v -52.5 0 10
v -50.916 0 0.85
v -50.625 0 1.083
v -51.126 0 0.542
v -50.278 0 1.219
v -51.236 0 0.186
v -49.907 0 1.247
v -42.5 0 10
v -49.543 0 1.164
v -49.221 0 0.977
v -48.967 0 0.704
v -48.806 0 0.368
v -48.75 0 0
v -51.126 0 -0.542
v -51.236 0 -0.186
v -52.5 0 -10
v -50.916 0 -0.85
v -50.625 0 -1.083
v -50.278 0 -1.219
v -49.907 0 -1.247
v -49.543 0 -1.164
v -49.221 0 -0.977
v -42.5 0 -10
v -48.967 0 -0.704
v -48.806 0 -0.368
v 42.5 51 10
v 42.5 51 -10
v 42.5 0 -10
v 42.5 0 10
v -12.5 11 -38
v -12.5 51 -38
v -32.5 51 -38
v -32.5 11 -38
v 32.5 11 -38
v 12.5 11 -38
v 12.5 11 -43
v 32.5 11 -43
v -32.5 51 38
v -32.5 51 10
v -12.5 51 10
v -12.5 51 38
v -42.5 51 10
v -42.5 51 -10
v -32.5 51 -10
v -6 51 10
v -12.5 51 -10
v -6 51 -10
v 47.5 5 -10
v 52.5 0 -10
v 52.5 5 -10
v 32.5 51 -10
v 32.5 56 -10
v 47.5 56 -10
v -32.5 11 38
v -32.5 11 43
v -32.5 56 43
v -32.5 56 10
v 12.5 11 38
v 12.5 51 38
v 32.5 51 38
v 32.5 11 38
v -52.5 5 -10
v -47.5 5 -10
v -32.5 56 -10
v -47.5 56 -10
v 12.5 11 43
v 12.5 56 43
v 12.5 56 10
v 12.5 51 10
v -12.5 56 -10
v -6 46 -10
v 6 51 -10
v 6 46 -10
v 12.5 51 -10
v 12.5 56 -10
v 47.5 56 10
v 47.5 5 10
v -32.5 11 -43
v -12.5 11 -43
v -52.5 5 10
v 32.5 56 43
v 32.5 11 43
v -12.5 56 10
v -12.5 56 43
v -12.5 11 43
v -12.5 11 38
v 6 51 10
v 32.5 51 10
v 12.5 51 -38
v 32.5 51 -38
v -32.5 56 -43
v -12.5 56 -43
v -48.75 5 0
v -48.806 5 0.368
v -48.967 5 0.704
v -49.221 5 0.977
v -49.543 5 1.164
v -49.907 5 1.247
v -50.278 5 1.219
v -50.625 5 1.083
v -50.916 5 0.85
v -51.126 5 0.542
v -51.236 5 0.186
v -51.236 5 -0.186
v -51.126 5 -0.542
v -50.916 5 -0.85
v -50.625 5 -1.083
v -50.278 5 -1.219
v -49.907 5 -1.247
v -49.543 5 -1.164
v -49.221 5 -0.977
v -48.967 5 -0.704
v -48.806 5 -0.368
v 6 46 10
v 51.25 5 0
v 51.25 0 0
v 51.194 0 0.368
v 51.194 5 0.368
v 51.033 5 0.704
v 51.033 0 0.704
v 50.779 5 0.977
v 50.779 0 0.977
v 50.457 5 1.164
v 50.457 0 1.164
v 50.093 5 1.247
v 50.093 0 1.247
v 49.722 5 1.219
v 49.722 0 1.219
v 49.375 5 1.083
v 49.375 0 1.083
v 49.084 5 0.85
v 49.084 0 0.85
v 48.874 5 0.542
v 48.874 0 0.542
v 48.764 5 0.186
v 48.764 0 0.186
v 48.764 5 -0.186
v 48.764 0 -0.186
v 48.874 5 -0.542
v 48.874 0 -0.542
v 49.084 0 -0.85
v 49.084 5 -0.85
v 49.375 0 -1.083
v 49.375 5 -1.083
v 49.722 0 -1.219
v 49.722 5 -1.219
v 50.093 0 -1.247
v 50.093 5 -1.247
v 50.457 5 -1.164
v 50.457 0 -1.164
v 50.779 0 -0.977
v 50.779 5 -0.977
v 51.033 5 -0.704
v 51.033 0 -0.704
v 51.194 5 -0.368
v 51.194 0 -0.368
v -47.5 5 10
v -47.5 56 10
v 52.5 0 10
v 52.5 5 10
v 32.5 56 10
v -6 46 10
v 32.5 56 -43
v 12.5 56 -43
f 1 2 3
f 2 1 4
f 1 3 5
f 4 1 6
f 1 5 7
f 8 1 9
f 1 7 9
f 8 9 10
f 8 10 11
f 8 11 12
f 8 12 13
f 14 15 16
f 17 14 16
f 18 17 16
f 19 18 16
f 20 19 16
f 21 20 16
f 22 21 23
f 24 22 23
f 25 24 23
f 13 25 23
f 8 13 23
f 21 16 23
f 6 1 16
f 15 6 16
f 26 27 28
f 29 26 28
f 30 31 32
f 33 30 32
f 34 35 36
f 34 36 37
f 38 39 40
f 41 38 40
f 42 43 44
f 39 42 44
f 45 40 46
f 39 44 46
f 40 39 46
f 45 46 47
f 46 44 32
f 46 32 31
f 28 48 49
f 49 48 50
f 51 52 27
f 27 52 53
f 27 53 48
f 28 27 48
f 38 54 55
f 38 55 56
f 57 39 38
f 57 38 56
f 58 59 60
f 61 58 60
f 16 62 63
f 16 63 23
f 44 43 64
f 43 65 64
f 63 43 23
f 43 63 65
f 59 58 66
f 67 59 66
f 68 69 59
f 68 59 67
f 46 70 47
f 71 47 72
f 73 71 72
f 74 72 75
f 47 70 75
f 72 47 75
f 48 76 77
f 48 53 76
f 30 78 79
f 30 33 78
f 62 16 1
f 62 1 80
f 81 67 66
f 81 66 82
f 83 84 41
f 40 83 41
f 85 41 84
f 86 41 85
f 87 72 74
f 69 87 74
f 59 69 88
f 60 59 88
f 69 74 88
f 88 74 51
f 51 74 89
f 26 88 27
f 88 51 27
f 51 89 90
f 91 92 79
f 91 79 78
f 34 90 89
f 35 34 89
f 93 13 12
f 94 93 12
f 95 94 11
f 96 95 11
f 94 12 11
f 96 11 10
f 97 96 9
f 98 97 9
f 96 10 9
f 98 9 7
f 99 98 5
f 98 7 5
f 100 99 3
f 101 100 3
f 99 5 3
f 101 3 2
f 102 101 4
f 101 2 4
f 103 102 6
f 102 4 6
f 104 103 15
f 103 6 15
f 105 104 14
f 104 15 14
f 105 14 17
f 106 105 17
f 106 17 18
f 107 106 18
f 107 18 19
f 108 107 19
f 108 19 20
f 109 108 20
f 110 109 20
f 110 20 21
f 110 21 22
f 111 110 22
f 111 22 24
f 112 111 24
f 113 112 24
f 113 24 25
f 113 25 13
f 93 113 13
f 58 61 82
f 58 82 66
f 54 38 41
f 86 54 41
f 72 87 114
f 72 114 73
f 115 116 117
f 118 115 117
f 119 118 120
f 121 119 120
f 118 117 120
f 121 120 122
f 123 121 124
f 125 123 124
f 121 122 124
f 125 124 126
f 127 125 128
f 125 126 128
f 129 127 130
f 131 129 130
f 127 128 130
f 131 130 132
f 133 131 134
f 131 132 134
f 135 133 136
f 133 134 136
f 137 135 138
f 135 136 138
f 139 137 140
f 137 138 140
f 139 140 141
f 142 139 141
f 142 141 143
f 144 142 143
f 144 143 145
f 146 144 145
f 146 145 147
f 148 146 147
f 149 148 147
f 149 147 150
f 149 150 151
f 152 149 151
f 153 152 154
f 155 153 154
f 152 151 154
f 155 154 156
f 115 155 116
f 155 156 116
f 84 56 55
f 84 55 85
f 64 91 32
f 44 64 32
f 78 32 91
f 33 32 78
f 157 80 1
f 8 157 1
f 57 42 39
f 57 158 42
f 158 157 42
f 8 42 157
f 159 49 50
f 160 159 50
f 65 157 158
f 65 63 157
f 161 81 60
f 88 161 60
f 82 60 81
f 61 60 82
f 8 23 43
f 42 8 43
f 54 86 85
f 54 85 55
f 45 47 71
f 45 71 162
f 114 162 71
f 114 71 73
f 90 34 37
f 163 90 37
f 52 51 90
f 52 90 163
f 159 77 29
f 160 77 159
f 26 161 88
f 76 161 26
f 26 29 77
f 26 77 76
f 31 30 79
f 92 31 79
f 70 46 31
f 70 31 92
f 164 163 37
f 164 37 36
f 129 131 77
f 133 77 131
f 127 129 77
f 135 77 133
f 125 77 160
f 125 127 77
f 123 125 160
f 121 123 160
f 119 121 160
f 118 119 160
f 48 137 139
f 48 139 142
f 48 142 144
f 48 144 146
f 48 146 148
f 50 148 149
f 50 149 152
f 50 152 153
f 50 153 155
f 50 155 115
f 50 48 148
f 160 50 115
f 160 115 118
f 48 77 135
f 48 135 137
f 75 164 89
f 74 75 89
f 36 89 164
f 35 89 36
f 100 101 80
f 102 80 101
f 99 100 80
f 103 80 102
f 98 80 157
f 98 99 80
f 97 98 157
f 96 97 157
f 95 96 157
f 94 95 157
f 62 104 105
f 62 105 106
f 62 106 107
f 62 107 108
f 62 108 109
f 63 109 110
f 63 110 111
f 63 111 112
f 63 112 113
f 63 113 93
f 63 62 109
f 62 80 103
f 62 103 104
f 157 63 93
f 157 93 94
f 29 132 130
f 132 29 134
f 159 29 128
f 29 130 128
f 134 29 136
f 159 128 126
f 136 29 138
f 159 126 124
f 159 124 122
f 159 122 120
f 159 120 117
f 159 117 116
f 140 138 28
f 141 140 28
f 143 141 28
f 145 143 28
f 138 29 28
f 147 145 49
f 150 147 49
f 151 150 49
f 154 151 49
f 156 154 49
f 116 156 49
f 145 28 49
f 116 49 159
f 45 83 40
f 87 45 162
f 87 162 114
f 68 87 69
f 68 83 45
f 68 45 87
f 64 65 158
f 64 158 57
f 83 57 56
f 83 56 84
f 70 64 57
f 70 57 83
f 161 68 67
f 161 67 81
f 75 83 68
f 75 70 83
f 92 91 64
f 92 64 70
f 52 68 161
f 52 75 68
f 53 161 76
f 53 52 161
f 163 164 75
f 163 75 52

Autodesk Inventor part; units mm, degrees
ref_plane "YZ Plane" through (0, 0, 0) normal (1, 0, 0) x (0, 1, 0)
ref_plane "XZ Plane" through (0, 0, 0) normal (0, 1, 0) x (-1, 0, 0)
ref_plane "XY Plane" through (0, 0, 0) normal (0, 0, 1) x (1, 0, 0)
sketch "Sketch1" plane through (0, 0, 0) normal (0, 0, 1) x (1, 0, 0)
  line L0 (-52.5, 5) -> (-47.5, 5)
  line L1 (-47.5, 5) -> (-47.5, 56)
  line L2 (-47.5, 56) -> (47.5, 56)
  line L3 (47.5, 56) -> (47.5, 5)
  line L4 (47.5, 5) -> (52.5, 5)
  line L5 (-42.5, 0) -> (-42.5, 51)
  line L6 (-42.5, 51) -> (42.5, 51)
  line L7 (42.5, 51) -> (42.5, 0)
  line L8 (0, 0) -> (0, -25.7238) construction
  line L9 (52.5, 0) -> (52.5, 5)
  line L10 (-52.5, 0) -> (-52.5, 5)
  line L11 (-52.5, 0) -> (-42.5, 0)
  line L12 (42.5, 0) -> (52.5, 0)
  line L13 (-32.5, 56) -> (-12.5, 56)
  line L14 (-12.5, 56) -> (-12.5, 51)
  line L15 (-12.5, 51) -> (-32.5, 51)
  line L16 (-32.5, 51) -> (-32.5, 56)
  line L17 (12.5, 56) -> (32.5, 56)
  line L18 (32.5, 56) -> (32.5, 51)
  line L19 (32.5, 51) -> (12.5, 51)
  line L20 (12.5, 51) -> (12.5, 56)
  line L21 (-32.5, 56) -> (-12.5, 56)
  line L22 (-12.5, 56) -> (-12.5, 11)
  line L23 (-12.5, 11) -> (-32.5, 11)
  line L24 (-32.5, 11) -> (-32.5, 56)
  line L25 (12.5, 56) -> (32.5, 56)
  line L26 (32.5, 56) -> (32.5, 11)
  line L27 (32.5, 11) -> (12.5, 11)
  line L28 (12.5, 11) -> (12.5, 56)
  point P0 (32.5, 56)
  point P1 (-32.5, 51)
  point P2 (-12.5, 56)
  point P3 (32.5, 56)
  point P4 (-32.5, 56)
  dimension "d1" = 5
  dimension "d2" = 5
  dimension "d3" = 5
  dimension "d5" = 85
  dimension "d6" = 51
  dimension "d8" = 5
  dimension "d18" = 105
  dimension "d19" = 20
  dimension "d20" = 25
  dimension "d21" = 45
extrude "Extrusion1" add sketch "Sketch1" along normal mid plane 20 contours L0 L1 L2 L16 L6 L5 L11 L10 | L2 L14 L6 L16 | L2 L20 L6 L14 | L2 L18 L6 L20 | L2 L3 L4 L9 L12 L7 L6 L18
sketch "Sketch2" plane through (-52.5, 0, 10) normal (0, -1, 0) x (1, 0, 0)
  circle A0 centre (2.5, -10) radius 1.25
  circle A1 centre (102.5, -10) radius 1.25
  line L0 (52.5, -10) -> (52.5, 0) construction
  line L1 (10, 0) -> (95, 0) construction
  circle A2 centre (2.5, -10) radius 2.25
  circle A3 centre (102.5, -10) radius 2.25
  dimension "d11" = 2.5
  dimension "d12" = 100
  dimension "d15" = 4.5
extrude "Extrusion2" cut sketch "Sketch2" against normal through all contours A0 | A1
extrude "Extrusion4" add sketch "Sketch1" along normal blind 28 from surface at 10 contours L2 L14 L6 L16 | L2 L18 L6 L20
extrude "Extrusion5" add sketch "Sketch1" along normal blind 5 from surface at 38 contours L2 L14 L6 L16 | L6 L22 L23 L24 | L2 L18 L6 L20 | L6 L26 L27 L28
mirror "Mirror1" about plane through (0, 0, 0) normal (0, 0, 1) of "Extrusion5", "Extrusion4"
sketch "Sketch3" plane through (42.5, 51, -10) normal (0, -1, 0) x (1, 0, 0)
  line L0 (-55, 20) -> (-30, 20) projected
  line L1 (-36.5, 0) -> (-48.5, 0)
  line L2 (-48.5, 0) -> (-48.5, 20)
  line L3 (-48.5, 20) -> (-36.5, 20)
  line L4 (-36.5, 20) -> (-36.5, 0)
  line L5 (-36.5, 0) -> (-48.5, 20) construction
  line L6 (-48.5, 0) -> (-36.5, 20) construction
  point P0 (-42.5, 10)
  dimension "d26" = 12
extrude "Extrusion6" add sketch "Sketch3" along normal blind 5
equation "\"d1\" = d8"
equation "\"d2\" = d8"
equation "\"d3\" = d8"
properties part number "battery_fix"
